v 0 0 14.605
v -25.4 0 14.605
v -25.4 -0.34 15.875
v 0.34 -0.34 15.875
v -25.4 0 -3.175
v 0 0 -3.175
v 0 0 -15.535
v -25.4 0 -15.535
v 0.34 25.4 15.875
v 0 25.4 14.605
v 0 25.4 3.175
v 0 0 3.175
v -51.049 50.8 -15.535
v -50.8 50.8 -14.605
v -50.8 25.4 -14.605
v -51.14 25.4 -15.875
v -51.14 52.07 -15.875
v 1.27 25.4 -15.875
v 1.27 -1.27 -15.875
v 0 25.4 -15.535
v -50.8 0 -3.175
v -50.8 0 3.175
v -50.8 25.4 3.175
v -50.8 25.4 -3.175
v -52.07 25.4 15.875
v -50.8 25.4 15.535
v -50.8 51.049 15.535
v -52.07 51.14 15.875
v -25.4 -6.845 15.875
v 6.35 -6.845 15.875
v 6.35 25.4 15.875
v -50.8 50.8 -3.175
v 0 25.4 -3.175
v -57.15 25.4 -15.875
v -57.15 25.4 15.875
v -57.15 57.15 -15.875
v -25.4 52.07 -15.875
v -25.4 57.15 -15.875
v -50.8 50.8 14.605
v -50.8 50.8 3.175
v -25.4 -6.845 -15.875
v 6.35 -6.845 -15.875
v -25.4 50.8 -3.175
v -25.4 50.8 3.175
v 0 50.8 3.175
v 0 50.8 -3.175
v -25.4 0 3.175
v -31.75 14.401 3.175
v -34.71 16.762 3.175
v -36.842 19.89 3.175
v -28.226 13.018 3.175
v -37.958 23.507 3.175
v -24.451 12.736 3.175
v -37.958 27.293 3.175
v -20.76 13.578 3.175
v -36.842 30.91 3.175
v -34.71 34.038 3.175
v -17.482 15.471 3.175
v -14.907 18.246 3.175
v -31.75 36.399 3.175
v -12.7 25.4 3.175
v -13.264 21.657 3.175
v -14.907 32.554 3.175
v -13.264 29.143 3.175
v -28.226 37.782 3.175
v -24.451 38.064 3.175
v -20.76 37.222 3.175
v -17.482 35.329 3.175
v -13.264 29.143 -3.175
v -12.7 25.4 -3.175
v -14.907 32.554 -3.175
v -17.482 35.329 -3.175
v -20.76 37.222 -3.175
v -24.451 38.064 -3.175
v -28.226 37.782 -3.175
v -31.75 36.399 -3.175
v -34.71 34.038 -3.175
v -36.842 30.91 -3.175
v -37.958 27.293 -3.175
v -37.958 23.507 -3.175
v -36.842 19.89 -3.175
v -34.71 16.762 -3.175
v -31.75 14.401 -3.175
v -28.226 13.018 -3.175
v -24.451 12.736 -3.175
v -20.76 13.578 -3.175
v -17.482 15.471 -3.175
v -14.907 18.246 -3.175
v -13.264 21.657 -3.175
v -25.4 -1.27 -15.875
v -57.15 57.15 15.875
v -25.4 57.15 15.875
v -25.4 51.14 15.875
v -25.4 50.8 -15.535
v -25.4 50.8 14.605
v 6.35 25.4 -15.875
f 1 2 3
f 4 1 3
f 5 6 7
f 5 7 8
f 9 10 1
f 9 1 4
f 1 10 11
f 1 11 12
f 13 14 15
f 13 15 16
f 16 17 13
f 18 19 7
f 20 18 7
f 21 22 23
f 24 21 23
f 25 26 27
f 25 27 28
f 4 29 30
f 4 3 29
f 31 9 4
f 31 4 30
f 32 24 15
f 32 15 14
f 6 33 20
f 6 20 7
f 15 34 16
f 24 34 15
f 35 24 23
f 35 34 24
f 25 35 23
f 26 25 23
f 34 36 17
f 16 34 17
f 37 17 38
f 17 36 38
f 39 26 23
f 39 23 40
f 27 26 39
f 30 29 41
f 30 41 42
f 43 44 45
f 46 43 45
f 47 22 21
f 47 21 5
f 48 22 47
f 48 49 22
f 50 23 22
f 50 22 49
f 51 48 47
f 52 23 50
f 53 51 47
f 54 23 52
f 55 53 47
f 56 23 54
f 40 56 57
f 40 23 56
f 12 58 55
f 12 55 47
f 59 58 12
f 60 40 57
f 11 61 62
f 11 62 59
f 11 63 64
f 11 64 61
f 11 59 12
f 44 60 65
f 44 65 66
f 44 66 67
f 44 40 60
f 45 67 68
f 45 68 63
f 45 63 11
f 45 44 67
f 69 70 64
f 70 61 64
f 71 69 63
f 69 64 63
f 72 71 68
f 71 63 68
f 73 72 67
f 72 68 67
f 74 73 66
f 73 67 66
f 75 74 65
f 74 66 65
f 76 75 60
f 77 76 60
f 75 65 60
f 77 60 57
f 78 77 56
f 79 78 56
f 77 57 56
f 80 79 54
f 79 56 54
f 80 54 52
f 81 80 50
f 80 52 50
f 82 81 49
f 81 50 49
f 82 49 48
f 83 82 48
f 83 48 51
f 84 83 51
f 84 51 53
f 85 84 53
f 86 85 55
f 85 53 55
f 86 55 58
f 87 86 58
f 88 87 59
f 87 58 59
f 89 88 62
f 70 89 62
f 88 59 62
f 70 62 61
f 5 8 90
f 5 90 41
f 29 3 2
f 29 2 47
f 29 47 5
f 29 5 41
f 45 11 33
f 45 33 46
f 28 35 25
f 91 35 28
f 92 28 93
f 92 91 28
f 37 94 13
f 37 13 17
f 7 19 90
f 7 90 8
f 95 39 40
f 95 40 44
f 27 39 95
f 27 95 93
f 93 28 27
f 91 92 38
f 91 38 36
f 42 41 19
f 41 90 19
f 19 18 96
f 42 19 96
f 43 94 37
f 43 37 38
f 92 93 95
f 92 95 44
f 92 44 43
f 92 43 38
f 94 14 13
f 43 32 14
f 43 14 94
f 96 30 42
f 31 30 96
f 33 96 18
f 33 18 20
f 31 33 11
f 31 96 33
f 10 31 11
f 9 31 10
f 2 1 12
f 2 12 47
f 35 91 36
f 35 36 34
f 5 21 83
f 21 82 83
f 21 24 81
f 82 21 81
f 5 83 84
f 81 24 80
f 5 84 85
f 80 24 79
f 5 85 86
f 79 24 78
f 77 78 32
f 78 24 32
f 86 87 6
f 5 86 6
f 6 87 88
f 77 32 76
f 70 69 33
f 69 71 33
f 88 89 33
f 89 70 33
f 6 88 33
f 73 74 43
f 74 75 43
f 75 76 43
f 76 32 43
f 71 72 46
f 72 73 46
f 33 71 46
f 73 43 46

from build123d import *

# Parameters (mm, degrees)
F0_W          = 50.8
F0_H          = 50.8
F3_DEPTH      = 3.175
F4_DEPTH      = 15.875
F5_DEPTH      = 15.875
F6_T1_DEPTH   = 28.6978363942
F6_T3_DEPTH   = 28.6978363942
F6_T5_DEPTH   = 28.6978363942
F6_T7_DEPTH   = 28.6978363942
F6_T13_DEPTH  = 31.9956727883
F6_T17_DEPTH  = 31.9956727883
F6_T24_DEPTH  = 31.9956727883
F6_T28_DEPTH  = 31.9956727883
F6_T35_DEPTH  = 31.9956727883
F6_T39_DEPTH  = 31.9956727883
F6_T46_DEPTH  = 31.9956727883
F6_T50_DEPTH  = 31.9956727883
F7_R          = 12.7
F8_DEPTH      = 15.876
F8_DEPTH_BACK = 15.876


# Not quite as in the source:
# - a fillet or chamfer that OpenCascade refuses, or shapes differently, is made with other operations: its cross-section is extruded or revolved along the edge and cut away or added


with BuildPart() as f3:
    # F0 (on Top) → F3 (new body, symmetric)
    with BuildSketch(Plane.XY):
        with Locations((-25.4, 25.4)):
            Rectangle(F0_W, F0_H)
    extrude(amount=F3_DEPTH, both=True)

    # F1 (on Top) → F4 (join, symmetric)
    with BuildSketch(Plane.XY):
        Polygon((0, 25.4), (0, 0), (-25.4, 0), (-25.4, -6.8448194891), (6.35, -6.8448194891), (6.35, 25.4), align=None)
    extrude(amount=F4_DEPTH, both=True)

    # F2 (on Top) → F5 (join, symmetric)
    with BuildSketch(Plane.XY):
        Polygon((-50.8, 50.8), (-25.4, 50.8), (-25.4, 57.15), (-57.15, 57.15), (-57.15, 25.4), (-50.8, 25.4), align=None)
    extrude(amount=F5_DEPTH, both=True)

    # F6: chamfer of 1.27 x 0.3402954744 on 8 edges, made by hand

    # F6_s2 → F6_t1 (cut)
    with BuildSketch(Plane.YZ.offset(-28.6978363942)):
        Polygon((0, 14.605), (-0.3402954744, 15.875), (0, 15.875), align=None)
        Polygon((-1.27, -15.875), (0, -15.5347045256), (0, -15.875), align=None)
    extrude(amount=F6_T1_DEPTH, mode=Mode.SUBTRACT)

    # F6_s4 → F6_t3 (cut)
    with BuildSketch(Plane.XZ.offset(-28.6978363942)):
        Polygon((0, 14.605), (0.3402954744, 15.875), (0, 15.875), align=None)
        Polygon((1.27, -15.875), (0, -15.5347045256), (0, -15.875), align=None)
    extrude(amount=F6_T3_DEPTH, mode=Mode.SUBTRACT)

    # F6_s6 → F6_t5 (cut)
    with BuildSketch(Plane.YZ.offset(-50.8)):
        Polygon((50.8, 14.605), (51.1402954744, 15.875), (50.8, 15.875), align=None)
        Polygon((50.8, -15.5347045256), (52.07, -15.875), (50.8, -15.875), align=None)
    extrude(amount=F6_T5_DEPTH, mode=Mode.SUBTRACT)

    # F6_s8 → F6_t7 (cut)
    with BuildSketch(Plane.XZ.offset(-50.8)):
        Polygon((-50.8, 15.5347045256), (-52.07, 15.875), (-50.8, 15.875), align=None)
        Polygon((-50.8, -14.605), (-51.1402954744, -15.875), (-50.8, -15.875), align=None)
    extrude(amount=F6_T7_DEPTH, mode=Mode.SUBTRACT)


with BuildPart() as f6_tool11:
    # F6_s12 → F6_t13 (new body)
    with BuildSketch(Plane.YZ.offset(3.2978363942)):
        Polygon((0, 14.605), (-0.3402954744, 15.875), (0, 15.875), align=None)
    extrude(amount=-F6_T13_DEPTH)

    split(bisect_by=Plane.YZ, keep=Keep.TOP)


with BuildPart() as f6_tool15:
    # F6_s16 → F6_t17 (new body)
    with BuildSketch(Plane.XZ.offset(-28.6978363942)):
        Polygon((0, 14.605), (0.3402954744, 15.875), (0, 15.875), align=None)
    extrude(amount=F6_T17_DEPTH)

    split(bisect_by=Plane.XZ, keep=Keep.TOP)


with BuildPart() as f6_tool11_1:
    add(f6_tool11.part)

    # F6_t19: intersect F6_tool15
    add(f6_tool15.part, mode=Mode.INTERSECT)


with BuildPart() as f3_1:
    add(f3.part)

    # F6_t9: cut F6_tool11
    add(f6_tool11_1.part, mode=Mode.SUBTRACT)


with BuildPart() as f6_tool22:
    # F6_s23 → F6_t24 (new body)
    with BuildSketch(Plane.YZ.offset(-54.0978363942)):
        Polygon((50.8, 14.605), (51.1402954744, 15.875), (50.8, 15.875), align=None)
    extrude(amount=F6_T24_DEPTH)

    split(bisect_by=Plane.YZ.offset(-50.8), keep=Keep.BOTTOM)


with BuildPart() as f6_tool26:
    # F6_s27 → F6_t28 (new body)
    with BuildSketch(Plane.XZ.offset(-22.1021636058)):
        Polygon((-50.8, 15.5347045256), (-52.07, 15.875), (-50.8, 15.875), align=None)
    extrude(amount=-F6_T28_DEPTH)

    split(bisect_by=Plane.XZ.offset(-50.8), keep=Keep.BOTTOM)


with BuildPart() as f6_tool22_1:
    add(f6_tool22.part)

    # F6_t30: intersect F6_tool26
    add(f6_tool26.part, mode=Mode.INTERSECT)


with BuildPart() as f3_2:
    add(f3_1.part)

    # F6_t20: cut F6_tool22
    add(f6_tool22_1.part, mode=Mode.SUBTRACT)


with BuildPart() as f6_tool33:
    # F6_s34 → F6_t35 (new body)
    with BuildSketch(Plane.XZ.offset(-28.6978363942)):
        Polygon((1.27, -15.875), (0, -15.5347045256), (0, -15.875), align=None)
    extrude(amount=F6_T35_DEPTH)

    split(bisect_by=Plane.XZ, keep=Keep.TOP)


with BuildPart() as f6_tool37:
    # F6_s38 → F6_t39 (new body)
    with BuildSketch(Plane.YZ.offset(3.2978363942)):
        Polygon((-1.27, -15.875), (0, -15.5347045256), (0, -15.875), align=None)
    extrude(amount=-F6_T39_DEPTH)

    split(bisect_by=Plane.YZ, keep=Keep.TOP)


with BuildPart() as f6_tool33_1:
    add(f6_tool33.part)

    # F6_t41: intersect F6_tool37
    add(f6_tool37.part, mode=Mode.INTERSECT)


with BuildPart() as f3_3:
    add(f3_2.part)

    # F6_t31: cut F6_tool33
    add(f6_tool33_1.part, mode=Mode.SUBTRACT)


with BuildPart() as f6_tool44:
    # F6_s45 → F6_t46 (new body)
    with BuildSketch(Plane.YZ.offset(-54.0978363942)):
        Polygon((50.8, -15.5347045256), (52.07, -15.875), (50.8, -15.875), align=None)
    extrude(amount=F6_T46_DEPTH)

    split(bisect_by=Plane.YZ.offset(-50.8), keep=Keep.BOTTOM)


with BuildPart() as f6_tool48:
    # F6_s49 → F6_t50 (new body)
    with BuildSketch(Plane.XZ.offset(-22.1021636058)):
        Polygon((-50.8, -14.605), (-51.1402954744, -15.875), (-50.8, -15.875), align=None)
    extrude(amount=-F6_T50_DEPTH)

    split(bisect_by=Plane.XZ.offset(-50.8), keep=Keep.BOTTOM)


with BuildPart() as f6_tool44_1:
    add(f6_tool44.part)

    # F6_t52: intersect F6_tool48
    add(f6_tool48.part, mode=Mode.INTERSECT)


with BuildPart() as f3_4:
    add(f3_3.part)

    # F6_t42: cut F6_tool44
    add(f6_tool44_1.part, mode=Mode.SUBTRACT)

    # F7 (on Top) → F8 (cut, two sides)
    with BuildSketch(Plane.XY) as f8_sk:
        with Locations((-25.4, 25.4)):
            Circle(F7_R)
    extrude(amount=-F8_DEPTH, mode=Mode.SUBTRACT)
    extrude(f8_sk.sketch, amount=F8_DEPTH_BACK, mode=Mode.SUBTRACT)


solid = f3_4.part
